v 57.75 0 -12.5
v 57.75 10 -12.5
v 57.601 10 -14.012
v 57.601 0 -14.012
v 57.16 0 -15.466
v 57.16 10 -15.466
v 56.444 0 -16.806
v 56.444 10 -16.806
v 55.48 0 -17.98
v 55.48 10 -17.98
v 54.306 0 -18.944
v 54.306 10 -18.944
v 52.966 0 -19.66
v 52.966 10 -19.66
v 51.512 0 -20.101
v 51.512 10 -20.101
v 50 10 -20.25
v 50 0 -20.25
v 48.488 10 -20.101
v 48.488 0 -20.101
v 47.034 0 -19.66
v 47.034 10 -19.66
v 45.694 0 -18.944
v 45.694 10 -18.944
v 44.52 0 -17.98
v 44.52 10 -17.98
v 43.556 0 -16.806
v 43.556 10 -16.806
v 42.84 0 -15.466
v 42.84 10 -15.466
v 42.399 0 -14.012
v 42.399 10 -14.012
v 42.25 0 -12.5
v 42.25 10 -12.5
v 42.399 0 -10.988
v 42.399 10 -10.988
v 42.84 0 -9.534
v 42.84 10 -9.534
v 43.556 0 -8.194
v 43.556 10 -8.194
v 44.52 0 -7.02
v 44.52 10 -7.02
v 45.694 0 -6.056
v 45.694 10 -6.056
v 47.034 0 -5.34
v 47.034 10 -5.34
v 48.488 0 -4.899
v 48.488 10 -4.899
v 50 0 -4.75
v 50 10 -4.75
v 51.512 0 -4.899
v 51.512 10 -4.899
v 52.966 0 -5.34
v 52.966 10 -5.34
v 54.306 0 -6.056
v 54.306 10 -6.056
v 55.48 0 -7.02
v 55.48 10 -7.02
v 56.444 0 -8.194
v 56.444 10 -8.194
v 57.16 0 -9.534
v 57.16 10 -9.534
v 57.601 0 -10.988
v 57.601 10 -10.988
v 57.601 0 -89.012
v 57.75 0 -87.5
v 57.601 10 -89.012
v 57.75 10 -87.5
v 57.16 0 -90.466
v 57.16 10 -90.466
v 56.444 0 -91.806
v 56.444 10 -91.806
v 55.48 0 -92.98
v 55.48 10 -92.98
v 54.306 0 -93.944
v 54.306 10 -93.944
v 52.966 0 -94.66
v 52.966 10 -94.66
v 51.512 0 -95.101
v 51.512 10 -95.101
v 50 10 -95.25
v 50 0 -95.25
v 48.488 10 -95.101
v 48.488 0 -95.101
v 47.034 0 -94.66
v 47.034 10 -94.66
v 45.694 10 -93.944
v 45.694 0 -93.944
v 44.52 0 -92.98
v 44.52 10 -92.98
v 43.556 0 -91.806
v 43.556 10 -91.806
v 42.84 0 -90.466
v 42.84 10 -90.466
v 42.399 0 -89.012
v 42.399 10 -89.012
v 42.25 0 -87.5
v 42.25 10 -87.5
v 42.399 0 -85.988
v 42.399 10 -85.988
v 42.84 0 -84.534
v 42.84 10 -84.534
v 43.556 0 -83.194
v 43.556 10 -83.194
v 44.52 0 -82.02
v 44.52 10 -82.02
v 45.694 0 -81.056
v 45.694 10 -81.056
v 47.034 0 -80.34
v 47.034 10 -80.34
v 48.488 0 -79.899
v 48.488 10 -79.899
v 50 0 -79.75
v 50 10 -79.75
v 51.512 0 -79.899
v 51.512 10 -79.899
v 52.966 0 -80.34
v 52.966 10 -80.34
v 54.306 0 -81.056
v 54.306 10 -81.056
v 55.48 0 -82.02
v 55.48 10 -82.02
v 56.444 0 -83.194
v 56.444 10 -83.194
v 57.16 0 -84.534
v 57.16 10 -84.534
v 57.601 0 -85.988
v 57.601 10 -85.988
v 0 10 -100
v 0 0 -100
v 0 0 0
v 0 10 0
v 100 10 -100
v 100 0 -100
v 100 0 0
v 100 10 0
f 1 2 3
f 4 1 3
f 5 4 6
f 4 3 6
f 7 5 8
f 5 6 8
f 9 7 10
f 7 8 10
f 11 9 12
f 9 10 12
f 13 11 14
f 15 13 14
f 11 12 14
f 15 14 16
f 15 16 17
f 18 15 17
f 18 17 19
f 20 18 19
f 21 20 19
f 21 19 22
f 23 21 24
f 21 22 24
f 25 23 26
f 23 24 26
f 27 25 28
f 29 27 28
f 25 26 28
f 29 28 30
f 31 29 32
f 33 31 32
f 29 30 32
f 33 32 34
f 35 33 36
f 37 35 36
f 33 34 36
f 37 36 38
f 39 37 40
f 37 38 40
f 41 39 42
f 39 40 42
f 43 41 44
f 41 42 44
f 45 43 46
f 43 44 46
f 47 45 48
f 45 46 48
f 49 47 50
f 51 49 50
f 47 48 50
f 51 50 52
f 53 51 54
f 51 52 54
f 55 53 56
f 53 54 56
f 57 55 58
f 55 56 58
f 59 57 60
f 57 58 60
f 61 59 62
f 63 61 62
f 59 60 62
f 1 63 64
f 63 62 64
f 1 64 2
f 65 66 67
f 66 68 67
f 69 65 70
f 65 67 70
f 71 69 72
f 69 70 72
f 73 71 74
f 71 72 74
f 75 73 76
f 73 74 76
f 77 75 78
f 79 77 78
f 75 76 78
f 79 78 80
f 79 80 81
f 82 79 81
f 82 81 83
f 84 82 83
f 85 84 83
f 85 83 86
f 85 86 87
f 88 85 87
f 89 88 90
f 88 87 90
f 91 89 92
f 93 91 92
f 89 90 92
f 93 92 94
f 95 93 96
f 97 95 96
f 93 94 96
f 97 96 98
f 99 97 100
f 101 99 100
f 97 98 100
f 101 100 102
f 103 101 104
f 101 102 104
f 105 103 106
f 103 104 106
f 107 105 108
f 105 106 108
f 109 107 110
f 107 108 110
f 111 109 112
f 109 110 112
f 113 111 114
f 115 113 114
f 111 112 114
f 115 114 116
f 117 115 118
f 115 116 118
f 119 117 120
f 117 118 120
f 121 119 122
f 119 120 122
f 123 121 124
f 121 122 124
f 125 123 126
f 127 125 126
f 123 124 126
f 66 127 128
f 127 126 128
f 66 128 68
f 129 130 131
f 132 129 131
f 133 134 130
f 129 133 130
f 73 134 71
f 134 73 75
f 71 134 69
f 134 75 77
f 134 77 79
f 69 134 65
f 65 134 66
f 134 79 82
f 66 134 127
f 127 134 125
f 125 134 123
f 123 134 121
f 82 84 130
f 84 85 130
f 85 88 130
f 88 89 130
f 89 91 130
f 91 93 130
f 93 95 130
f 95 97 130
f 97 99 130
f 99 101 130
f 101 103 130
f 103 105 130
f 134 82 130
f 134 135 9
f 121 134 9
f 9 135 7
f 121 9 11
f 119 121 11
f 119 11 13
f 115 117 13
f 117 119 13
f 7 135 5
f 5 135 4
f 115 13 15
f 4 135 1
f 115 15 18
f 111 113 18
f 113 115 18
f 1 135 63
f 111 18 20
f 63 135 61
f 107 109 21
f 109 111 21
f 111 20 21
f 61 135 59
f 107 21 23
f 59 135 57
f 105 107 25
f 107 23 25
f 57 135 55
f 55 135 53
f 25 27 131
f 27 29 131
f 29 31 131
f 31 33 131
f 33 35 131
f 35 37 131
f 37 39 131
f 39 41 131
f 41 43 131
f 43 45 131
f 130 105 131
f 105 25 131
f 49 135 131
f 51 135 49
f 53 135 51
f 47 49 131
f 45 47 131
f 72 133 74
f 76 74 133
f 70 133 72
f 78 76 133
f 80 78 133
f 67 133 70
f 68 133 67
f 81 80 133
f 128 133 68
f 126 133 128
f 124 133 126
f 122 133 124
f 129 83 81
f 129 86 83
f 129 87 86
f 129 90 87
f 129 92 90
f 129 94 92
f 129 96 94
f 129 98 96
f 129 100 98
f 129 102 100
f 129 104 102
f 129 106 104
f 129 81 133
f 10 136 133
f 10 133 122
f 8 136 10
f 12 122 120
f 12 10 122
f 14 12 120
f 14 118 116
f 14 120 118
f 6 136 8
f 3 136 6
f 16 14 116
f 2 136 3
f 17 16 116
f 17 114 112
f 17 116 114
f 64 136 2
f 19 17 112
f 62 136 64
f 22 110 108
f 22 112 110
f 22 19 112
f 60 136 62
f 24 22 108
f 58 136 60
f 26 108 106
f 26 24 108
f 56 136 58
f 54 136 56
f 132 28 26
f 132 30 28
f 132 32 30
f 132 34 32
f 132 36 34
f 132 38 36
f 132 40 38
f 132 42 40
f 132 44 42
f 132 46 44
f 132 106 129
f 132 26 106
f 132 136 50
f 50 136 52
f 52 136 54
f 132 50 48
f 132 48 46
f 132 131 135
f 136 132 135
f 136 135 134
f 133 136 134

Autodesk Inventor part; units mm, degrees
ref_plane "YZ Plane" through (0, 0, 0) normal (1, 0, 0) x (0, 1, 0)
ref_plane "XZ Plane" through (0, 0, 0) normal (0, 1, 0) x (-1, 0, 0)
ref_plane "XY Plane" through (0, 0, 0) normal (0, 0, 1) x (1, 0, 0)
sketch "Sketch1" plane through (0, 0, 0) normal (0, 1, 0) x (-1, 0, 0)
  line L0 (0, 0) -> (-100, 0)
  line L1 (-100, 0) -> (-100, -100)
  line L2 (-100, -100) -> (0, -100)
  line L3 (0, -100) -> (0, 0)
  dimension "d0" = 100
  dimension "d1" = 100
extrude "Extrusion1" add sketch "Sketch1" along normal blind 10
sketch "Sketch2" plane through (0, 10, 0) normal (0, 1, 0) x (1, 0, 0)
  circle A0 centre (50, 12.5) radius 7.75
  circle A1 centre (50, 87.5) radius 7.75
  line L0 (0, 0) -> (100, 0) projected
  line L1 (0, 100) -> (0, 0) projected
  line L2 (100, 100) -> (0, 100) projected
  dimension "d4" = 15.5
  dimension "d5" = 15.5
  dimension "d6" = 12.5
  dimension "d7" = 50
  dimension "d8" = 12.5
  dimension "d9" = 50
extrude "Extrusion2" cut sketch "Sketch2" against normal blind 10
properties part number "Ba" material "Wood (Oak)"
